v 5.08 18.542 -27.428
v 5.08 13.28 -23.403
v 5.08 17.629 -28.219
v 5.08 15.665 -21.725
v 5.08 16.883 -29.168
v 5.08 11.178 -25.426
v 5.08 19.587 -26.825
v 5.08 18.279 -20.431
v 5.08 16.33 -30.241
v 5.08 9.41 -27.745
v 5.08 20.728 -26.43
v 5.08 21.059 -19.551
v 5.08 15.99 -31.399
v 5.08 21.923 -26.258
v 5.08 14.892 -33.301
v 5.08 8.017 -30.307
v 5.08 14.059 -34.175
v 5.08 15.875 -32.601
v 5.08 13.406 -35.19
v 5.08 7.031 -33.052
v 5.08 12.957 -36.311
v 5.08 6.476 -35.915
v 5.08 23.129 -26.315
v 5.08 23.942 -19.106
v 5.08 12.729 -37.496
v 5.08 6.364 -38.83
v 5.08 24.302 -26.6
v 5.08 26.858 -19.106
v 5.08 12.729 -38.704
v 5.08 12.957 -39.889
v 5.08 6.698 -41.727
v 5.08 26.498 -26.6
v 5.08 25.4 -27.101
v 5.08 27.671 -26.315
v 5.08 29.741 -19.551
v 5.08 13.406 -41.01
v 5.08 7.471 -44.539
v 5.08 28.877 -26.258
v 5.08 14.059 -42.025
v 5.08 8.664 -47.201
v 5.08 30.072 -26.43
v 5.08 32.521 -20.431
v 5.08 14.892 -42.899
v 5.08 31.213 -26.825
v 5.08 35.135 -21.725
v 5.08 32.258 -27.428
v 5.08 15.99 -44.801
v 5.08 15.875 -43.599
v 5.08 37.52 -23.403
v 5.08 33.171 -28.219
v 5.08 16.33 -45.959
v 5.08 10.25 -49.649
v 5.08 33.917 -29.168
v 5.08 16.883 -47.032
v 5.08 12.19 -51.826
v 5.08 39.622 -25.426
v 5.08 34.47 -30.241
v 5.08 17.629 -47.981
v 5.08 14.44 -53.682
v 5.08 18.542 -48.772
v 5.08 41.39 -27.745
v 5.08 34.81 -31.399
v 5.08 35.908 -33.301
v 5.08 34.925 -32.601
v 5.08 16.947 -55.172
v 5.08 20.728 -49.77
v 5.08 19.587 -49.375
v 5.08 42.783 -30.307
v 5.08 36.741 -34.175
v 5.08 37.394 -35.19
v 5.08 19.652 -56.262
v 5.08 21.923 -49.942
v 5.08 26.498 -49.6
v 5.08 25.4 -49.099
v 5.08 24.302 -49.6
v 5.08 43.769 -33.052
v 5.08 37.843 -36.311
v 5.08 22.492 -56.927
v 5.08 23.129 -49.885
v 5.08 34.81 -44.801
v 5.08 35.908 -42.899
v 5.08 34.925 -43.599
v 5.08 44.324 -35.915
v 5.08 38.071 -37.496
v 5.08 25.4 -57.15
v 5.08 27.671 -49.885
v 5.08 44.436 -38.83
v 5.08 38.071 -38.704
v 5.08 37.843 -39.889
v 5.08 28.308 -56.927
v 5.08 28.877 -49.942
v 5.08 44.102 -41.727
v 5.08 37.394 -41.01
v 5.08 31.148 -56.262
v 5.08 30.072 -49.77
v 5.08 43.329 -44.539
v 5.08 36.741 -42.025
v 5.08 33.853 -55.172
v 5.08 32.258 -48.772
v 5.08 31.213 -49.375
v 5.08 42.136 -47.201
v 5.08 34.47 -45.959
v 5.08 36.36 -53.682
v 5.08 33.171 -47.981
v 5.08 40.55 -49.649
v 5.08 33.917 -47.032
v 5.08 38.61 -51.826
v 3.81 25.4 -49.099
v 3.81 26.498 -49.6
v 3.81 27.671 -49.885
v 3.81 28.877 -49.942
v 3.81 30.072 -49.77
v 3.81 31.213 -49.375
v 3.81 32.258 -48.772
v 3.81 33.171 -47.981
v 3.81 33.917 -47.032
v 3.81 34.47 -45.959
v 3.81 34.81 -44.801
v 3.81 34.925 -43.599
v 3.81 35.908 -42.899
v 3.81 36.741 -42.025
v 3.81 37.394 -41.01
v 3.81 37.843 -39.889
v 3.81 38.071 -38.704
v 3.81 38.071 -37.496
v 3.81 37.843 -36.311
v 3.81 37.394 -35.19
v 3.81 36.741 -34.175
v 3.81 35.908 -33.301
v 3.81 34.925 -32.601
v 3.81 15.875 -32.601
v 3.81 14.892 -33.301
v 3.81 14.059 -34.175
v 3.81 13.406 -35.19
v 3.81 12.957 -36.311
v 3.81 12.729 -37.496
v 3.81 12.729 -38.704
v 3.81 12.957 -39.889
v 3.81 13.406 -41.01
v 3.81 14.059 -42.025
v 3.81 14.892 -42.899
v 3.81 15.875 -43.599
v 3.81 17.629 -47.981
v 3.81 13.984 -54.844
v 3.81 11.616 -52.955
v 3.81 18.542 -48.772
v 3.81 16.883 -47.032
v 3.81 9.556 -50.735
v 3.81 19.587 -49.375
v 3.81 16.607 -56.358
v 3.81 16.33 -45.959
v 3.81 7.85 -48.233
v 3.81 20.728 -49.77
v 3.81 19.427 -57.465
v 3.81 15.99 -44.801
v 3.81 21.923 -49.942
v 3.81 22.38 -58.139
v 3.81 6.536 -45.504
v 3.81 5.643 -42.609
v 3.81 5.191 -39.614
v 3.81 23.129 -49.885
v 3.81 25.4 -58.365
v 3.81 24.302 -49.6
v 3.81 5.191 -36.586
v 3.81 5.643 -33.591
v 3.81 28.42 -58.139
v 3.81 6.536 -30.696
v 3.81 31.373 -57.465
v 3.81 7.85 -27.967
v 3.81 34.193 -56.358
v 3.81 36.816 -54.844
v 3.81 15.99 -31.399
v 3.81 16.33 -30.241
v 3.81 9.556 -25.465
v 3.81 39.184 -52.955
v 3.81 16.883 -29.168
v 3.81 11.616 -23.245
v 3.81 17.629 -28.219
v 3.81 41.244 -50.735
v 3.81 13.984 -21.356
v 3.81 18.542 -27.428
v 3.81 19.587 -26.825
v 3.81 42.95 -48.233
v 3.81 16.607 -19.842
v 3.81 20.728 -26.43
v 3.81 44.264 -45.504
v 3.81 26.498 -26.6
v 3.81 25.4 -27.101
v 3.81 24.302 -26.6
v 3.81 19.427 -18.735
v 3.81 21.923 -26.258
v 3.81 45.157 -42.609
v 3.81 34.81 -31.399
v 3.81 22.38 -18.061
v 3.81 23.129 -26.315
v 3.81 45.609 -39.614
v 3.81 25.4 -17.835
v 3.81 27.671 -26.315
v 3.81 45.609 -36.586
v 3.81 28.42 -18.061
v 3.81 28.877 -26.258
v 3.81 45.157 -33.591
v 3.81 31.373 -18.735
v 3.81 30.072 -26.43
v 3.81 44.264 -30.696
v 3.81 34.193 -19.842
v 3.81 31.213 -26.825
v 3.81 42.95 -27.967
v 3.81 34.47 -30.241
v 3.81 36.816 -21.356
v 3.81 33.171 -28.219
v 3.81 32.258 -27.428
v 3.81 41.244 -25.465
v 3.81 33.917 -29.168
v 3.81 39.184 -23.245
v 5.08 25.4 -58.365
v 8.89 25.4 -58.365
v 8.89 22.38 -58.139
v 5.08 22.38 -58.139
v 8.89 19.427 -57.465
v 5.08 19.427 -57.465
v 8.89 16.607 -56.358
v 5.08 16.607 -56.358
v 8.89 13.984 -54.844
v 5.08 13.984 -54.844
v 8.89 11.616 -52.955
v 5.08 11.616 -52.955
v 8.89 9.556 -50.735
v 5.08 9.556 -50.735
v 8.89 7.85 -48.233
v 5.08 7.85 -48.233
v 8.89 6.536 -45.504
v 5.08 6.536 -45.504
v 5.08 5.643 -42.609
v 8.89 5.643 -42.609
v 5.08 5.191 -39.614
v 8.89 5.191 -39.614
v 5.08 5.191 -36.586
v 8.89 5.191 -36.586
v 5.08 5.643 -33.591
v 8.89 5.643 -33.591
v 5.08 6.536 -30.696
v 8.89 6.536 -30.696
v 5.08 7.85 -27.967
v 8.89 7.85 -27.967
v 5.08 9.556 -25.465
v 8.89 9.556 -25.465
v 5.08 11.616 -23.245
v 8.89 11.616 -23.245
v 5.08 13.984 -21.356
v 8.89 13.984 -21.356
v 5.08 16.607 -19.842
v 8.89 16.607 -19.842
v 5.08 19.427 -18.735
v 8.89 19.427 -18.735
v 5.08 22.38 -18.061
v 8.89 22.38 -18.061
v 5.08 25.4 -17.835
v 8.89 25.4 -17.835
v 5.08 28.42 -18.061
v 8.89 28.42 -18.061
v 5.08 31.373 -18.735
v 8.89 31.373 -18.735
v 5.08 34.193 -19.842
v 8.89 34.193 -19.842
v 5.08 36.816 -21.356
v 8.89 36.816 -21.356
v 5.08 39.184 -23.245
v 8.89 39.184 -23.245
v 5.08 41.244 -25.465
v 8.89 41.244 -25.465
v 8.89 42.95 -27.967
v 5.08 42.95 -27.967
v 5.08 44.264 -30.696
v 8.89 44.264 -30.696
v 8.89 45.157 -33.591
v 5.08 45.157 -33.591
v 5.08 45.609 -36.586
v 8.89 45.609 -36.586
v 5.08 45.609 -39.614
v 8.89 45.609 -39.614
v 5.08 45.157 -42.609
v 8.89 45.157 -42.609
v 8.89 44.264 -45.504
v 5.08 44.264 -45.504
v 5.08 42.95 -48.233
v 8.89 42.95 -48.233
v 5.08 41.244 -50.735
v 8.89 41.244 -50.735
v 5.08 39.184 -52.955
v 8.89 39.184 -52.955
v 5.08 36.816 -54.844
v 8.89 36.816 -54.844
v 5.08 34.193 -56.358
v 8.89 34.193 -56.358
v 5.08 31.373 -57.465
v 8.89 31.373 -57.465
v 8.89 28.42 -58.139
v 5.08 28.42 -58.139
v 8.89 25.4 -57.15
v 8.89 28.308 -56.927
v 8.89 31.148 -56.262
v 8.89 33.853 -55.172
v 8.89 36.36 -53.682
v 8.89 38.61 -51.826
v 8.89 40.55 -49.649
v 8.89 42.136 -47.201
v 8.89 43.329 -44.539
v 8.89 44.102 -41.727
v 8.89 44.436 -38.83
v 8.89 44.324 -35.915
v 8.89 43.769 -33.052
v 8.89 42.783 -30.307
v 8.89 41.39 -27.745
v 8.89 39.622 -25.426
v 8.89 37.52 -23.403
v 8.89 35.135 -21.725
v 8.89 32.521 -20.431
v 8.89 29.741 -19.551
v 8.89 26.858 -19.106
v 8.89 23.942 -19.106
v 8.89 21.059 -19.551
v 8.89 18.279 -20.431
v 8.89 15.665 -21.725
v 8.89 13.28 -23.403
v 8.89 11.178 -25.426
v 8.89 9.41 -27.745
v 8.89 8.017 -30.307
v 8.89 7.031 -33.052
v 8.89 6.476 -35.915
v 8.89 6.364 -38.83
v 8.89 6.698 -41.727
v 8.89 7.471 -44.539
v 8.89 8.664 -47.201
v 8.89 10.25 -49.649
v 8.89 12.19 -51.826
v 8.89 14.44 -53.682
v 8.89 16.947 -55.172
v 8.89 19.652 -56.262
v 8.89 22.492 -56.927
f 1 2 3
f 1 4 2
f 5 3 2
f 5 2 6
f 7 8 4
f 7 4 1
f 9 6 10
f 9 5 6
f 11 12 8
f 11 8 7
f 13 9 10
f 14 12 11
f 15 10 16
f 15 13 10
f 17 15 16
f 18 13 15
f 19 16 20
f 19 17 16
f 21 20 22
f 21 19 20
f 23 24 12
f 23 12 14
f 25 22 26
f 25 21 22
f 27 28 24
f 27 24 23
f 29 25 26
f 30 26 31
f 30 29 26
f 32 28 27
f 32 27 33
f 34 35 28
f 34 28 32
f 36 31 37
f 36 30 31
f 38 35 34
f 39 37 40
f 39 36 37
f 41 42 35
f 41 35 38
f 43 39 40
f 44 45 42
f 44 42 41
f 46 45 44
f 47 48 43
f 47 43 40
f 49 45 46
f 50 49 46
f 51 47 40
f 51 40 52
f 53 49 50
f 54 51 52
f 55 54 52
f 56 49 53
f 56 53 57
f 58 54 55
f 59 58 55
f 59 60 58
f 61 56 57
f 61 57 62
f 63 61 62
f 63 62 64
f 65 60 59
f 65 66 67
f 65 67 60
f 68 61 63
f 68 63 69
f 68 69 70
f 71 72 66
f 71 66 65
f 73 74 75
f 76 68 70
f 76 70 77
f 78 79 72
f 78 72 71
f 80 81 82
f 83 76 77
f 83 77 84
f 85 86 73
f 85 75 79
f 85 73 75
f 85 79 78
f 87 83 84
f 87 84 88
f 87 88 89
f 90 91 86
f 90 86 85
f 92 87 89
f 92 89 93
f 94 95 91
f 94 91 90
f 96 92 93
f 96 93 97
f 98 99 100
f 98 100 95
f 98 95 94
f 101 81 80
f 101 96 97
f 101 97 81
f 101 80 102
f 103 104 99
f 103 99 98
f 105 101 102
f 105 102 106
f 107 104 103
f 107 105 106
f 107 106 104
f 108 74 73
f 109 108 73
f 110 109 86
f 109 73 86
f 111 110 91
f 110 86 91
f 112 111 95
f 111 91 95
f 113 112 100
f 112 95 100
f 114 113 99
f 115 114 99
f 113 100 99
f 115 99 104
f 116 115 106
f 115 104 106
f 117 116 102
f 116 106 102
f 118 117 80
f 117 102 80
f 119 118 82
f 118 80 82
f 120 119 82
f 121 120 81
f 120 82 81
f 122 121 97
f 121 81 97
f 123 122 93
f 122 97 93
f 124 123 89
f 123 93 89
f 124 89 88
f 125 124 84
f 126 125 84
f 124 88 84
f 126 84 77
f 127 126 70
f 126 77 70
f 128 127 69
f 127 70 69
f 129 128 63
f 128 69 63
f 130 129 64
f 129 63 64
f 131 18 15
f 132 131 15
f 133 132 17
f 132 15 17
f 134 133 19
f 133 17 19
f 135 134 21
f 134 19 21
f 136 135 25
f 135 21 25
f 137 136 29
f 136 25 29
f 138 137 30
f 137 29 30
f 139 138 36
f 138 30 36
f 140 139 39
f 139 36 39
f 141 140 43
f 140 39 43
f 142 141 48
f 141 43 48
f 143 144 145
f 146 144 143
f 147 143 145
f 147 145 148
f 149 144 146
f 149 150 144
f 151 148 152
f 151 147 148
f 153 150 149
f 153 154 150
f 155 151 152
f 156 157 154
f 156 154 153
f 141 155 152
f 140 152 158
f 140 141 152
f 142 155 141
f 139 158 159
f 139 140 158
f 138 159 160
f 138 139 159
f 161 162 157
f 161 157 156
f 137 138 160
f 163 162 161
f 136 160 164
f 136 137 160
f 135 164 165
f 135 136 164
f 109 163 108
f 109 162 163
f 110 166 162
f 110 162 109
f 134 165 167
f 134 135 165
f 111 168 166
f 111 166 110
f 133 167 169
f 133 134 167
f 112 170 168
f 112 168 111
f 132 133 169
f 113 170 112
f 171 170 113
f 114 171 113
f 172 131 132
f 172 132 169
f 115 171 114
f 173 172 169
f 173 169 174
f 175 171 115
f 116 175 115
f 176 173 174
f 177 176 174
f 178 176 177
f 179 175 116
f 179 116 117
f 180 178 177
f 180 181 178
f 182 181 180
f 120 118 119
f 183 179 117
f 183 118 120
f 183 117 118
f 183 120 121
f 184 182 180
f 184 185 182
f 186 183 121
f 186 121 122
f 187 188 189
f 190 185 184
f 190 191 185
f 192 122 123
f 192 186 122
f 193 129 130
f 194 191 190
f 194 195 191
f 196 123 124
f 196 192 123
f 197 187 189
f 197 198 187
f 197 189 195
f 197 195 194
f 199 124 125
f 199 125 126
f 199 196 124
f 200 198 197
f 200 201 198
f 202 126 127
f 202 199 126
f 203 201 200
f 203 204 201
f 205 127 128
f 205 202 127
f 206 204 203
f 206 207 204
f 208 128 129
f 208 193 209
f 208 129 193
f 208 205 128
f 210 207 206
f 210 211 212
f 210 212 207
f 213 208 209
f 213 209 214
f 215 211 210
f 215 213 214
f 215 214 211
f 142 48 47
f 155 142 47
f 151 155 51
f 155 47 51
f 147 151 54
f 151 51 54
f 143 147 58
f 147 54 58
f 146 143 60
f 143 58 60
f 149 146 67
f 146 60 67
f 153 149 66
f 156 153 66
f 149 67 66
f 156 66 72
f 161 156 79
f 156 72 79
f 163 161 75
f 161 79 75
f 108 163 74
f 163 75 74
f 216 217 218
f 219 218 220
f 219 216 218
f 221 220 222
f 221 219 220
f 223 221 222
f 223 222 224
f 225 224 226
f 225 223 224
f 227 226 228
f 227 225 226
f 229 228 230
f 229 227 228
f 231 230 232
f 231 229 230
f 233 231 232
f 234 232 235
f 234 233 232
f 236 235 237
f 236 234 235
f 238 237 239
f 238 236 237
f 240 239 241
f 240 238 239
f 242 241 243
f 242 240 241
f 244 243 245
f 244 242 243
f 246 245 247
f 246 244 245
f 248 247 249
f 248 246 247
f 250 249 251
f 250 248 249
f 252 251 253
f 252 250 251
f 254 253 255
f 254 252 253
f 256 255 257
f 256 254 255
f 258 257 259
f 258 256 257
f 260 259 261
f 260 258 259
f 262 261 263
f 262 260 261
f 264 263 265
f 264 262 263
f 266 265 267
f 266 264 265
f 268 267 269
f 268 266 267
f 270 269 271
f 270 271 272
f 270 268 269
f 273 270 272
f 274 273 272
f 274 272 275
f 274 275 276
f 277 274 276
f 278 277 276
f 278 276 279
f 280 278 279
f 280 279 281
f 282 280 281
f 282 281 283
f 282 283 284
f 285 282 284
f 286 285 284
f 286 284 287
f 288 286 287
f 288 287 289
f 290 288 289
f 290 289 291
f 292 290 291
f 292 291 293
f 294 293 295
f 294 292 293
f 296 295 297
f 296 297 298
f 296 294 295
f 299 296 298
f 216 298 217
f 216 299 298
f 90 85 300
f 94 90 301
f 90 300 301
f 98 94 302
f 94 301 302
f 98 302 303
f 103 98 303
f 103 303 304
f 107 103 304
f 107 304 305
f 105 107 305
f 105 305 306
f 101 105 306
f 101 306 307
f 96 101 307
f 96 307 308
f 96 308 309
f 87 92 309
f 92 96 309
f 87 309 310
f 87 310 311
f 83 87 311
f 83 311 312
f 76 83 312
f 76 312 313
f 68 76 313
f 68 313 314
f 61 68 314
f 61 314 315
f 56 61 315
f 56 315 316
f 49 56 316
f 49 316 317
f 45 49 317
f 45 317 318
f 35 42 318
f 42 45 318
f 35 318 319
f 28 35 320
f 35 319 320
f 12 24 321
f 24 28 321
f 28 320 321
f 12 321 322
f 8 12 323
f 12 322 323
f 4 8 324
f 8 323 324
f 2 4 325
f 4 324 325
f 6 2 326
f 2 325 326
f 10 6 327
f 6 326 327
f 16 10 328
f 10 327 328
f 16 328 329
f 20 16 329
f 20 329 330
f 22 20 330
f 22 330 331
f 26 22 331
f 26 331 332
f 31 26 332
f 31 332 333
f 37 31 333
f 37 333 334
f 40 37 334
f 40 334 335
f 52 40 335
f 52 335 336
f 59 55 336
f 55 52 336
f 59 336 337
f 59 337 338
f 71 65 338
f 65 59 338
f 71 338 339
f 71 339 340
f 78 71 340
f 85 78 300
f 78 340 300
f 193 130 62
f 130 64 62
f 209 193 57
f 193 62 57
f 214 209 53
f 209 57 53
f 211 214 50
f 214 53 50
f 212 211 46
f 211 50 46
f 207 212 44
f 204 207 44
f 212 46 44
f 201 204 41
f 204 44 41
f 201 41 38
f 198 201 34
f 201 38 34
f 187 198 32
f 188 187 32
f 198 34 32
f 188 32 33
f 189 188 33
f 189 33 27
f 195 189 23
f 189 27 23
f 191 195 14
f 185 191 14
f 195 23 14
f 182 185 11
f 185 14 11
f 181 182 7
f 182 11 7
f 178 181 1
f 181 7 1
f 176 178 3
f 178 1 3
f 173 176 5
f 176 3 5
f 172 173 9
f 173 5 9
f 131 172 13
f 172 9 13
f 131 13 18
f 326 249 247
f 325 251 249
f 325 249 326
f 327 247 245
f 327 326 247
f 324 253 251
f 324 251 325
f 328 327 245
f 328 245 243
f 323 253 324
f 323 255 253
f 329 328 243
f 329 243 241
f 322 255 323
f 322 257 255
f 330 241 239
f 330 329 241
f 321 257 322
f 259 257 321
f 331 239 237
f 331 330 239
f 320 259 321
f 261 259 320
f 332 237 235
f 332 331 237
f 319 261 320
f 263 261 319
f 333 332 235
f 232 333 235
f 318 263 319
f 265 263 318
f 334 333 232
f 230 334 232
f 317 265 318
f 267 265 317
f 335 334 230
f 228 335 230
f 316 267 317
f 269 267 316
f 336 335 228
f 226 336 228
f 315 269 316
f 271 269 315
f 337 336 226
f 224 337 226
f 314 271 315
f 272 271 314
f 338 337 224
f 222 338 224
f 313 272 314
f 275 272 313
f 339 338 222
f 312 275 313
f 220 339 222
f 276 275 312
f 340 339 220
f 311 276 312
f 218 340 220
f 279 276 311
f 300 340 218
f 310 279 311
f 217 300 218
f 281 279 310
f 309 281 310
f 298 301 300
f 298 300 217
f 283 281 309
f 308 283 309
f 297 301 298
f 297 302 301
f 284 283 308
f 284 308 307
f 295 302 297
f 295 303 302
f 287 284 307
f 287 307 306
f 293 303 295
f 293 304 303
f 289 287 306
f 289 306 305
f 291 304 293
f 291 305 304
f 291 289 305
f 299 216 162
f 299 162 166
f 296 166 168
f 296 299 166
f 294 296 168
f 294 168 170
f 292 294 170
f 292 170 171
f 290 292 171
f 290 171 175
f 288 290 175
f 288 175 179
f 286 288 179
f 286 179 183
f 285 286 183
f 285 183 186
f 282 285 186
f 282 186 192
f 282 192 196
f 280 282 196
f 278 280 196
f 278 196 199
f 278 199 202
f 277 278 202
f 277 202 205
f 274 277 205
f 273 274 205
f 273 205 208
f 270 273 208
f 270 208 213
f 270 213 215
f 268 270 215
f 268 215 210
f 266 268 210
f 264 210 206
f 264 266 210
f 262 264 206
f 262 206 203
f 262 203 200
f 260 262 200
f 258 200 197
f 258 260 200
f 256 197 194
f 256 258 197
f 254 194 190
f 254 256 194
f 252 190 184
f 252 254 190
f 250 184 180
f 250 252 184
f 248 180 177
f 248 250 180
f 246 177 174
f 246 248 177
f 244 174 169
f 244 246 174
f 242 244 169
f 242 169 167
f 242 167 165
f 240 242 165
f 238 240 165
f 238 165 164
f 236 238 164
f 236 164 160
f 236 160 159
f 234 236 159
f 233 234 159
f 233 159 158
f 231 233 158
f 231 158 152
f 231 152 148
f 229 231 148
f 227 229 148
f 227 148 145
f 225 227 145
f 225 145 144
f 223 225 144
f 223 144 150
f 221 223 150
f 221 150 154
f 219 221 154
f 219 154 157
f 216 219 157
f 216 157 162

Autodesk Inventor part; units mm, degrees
ref_plane "YZ Plane" through (0, 0, 0) normal (1, 0, 0) x (0, 1, 0)
ref_plane "XZ Plane" through (0, 0, 0) normal (0, 1, 0) x (-1, 0, 0)
ref_plane "XY Plane" through (0, 0, 0) normal (0, 0, 1) x (1, 0, 0)
sketch "Sketch1" plane through (0, 0, 0) normal (0, 1, 0) x (-1, 0, 0)
  line L0 (0, 0) -> (-20.32, 0)
  line L1 (-20.32, 0) -> (-20.32, -76.2)
  line L2 (-20.32, -76.2) -> (0, -76.2)
  line L3 (0, -76.2) -> (0, 0)
  dimension "d0" = 20.32
  dimension "d1" = 76.2
extrude "Extrusion1" add sketch "Sketch1" along normal blind 7.62
sketch "Sketch2" plane through (0, 7.62, 0) normal (0, 1, 0) x (1, 0, 0)
  line L0 (0, 0) -> (0, 12.7)
  line L1 (0, 12.7) -> (20.32, 12.7)
  line L2 (20.32, 12.7) -> (20.32, 63.5)
  line L3 (20.32, 63.5) -> (0, 63.5)
  line L4 (0, 63.5) -> (0, 12.7)
  dimension "d4" = 12.7
  dimension "d5" = 20.32
  dimension "d6" = 50.8
extrude "Extrusion2" add sketch "Sketch2" along normal blind 43.18
sketch "Sketch3" plane through (20.32, 0, 0) normal (1, 0, 0) x (0, 0, -1)
  line L0 (12.7, 50.8) -> (63.5, 50.8) projected
  line L1 (38.1, 50.8) -> (38.1, 25.4)
  circle A0 centre (38.1, 25.4) radius 19.05
  point P0 (0, 0)
  dimension "d9" = 25.4
  dimension "d10" = 38.1
extrude "Extrusion3" cut sketch "Sketch3" against normal blind 15.24
fillet "Fillet1" radius 25.4 2 edges at (10.16, 50.8, -63.5) (10.16, 50.8, -12.7)
sketch "Sketch6" plane through (0, 7.62, 0) normal (0, 1, 0) x (1, 0, 0)
  line L0 (0, 0) -> (20.32, 0) projected
  line L1 (10.16, 0) -> (10.16, 6.35)
  line L2 (20.32, 76.2) -> (0, 76.2) projected
  line L3 (10.16, 76.2) -> (10.16, 69.85)
  dimension "d20" = 6.35
  dimension "d21" = 6.35
fillet "Fillet2" radius 25.4 2 edges at (10.16, 7.62, -63.5) (10.16, 7.62, -12.7)
hole "Hole1" at (10.16, 7.62, -6.35) at (10.16, 7.62, -69.85) direction (0, -1, 0) diameter 5.08 end through all counterbore diameter 10.16 counterbore depth 3.81
sketch "Sketch7" plane through (10.16, 7.62, -6.35) normal (0, -1, 0) x (1, 0, 0)
  circle A0 centre (0, 0) radius 5.08
  circle A1 centre (0, -63.5) radius 2.54 projected
  line L0 (-2.54, -63.5) -> (0, -63.5)
  circle A2 centre (0, -63.5) radius 5.08
  point P0 (-10.16, 6.35)
  dimension "d30" = 10.16
  dimension "d31" = 10.16
extrude "Extrusion5" cut sketch "Sketch7" against normal blind 15.24 contours A0 | A1 | A2
sketch "Sketch10" plane through (5.08, 25.4, -38.1) normal (1, 0, 0) x (0, 0, -1)
  line L0 (0, 0) -> (0, 6.35)
  circle A0 centre (0, 6.35) radius 6.35
  line L1 (0, 0) -> (-7.874, 13.6382)
  line L2 (0, 0) -> (15.748, 0) construction
  line L3 (0, 0) -> (7.874, 13.6382)
  line L4 (0, 0) -> (15.748, 0) construction
  circle A1 centre (-7.874, 13.6382) radius 1.651
  circle A2 centre (7.874, 13.6382) radius 1.651
  point P0 (-38.1, -25.4)
  dimension "d65" = 6.35
  dimension "d85" = 15.748
  dimension "d86" = 120
  dimension "d87" = 15.748
  dimension "d88" = 60
  dimension "d89" = 3.302
  dimension "d90" = 3.302
extrude "Extrusion8" cut sketch "Sketch10" against normal blind 25.4 contours L3 A0 | A0 L1 | L1 A0 L3
sketch "Sketch13" plane through (5.08, 25.4, -38.1) normal (1, 0, 0) x (0, 0, -1)
  circle A0 centre (0, 6.35) radius 6.35 projected
  point P0 (-38.1, -25.4)
  point P1 (0, 0)
pattern_circular "Circular Pattern3" count 6 over 360 about axis through (5.08, 25.4, -38.1) along (1, 0, 0) of "Extrusion8"
sketch "Sketch14" plane through (5.08, 25.4, -38.1) normal (1, 0, 0) x (0, 0, -1)
  circle A0 centre (0, 0) radius 20.2652
  circle A1 centre (0, 0) radius 51.9893
  point P0 (-38.1, -25.4)
extrude "Extrusion10" cut sketch "Sketch14" against normal mid plane 50.8
sketch "Sketch15" plane through (20.32, 25.4, -38.1) normal (1, 0, 0) x (0, 0, -1)
  circle A0 centre (0, 0) radius 23.435
  point P0 (-38.1, -25.4)
extrude "Extrusion11" cut sketch "Sketch15" against normal blind 11.43
sketch "Sketch16" plane through (0, 25.4, -38.1) normal (-1, 0, 0) x (0, 0, 1)
  circle A0 centre (0, 0) radius 24.6265
  point P0 (38.1, -25.4)
extrude "Extrusion12" cut sketch "Sketch16" against normal blind 3.81
properties part number "Motor Mount V2"
